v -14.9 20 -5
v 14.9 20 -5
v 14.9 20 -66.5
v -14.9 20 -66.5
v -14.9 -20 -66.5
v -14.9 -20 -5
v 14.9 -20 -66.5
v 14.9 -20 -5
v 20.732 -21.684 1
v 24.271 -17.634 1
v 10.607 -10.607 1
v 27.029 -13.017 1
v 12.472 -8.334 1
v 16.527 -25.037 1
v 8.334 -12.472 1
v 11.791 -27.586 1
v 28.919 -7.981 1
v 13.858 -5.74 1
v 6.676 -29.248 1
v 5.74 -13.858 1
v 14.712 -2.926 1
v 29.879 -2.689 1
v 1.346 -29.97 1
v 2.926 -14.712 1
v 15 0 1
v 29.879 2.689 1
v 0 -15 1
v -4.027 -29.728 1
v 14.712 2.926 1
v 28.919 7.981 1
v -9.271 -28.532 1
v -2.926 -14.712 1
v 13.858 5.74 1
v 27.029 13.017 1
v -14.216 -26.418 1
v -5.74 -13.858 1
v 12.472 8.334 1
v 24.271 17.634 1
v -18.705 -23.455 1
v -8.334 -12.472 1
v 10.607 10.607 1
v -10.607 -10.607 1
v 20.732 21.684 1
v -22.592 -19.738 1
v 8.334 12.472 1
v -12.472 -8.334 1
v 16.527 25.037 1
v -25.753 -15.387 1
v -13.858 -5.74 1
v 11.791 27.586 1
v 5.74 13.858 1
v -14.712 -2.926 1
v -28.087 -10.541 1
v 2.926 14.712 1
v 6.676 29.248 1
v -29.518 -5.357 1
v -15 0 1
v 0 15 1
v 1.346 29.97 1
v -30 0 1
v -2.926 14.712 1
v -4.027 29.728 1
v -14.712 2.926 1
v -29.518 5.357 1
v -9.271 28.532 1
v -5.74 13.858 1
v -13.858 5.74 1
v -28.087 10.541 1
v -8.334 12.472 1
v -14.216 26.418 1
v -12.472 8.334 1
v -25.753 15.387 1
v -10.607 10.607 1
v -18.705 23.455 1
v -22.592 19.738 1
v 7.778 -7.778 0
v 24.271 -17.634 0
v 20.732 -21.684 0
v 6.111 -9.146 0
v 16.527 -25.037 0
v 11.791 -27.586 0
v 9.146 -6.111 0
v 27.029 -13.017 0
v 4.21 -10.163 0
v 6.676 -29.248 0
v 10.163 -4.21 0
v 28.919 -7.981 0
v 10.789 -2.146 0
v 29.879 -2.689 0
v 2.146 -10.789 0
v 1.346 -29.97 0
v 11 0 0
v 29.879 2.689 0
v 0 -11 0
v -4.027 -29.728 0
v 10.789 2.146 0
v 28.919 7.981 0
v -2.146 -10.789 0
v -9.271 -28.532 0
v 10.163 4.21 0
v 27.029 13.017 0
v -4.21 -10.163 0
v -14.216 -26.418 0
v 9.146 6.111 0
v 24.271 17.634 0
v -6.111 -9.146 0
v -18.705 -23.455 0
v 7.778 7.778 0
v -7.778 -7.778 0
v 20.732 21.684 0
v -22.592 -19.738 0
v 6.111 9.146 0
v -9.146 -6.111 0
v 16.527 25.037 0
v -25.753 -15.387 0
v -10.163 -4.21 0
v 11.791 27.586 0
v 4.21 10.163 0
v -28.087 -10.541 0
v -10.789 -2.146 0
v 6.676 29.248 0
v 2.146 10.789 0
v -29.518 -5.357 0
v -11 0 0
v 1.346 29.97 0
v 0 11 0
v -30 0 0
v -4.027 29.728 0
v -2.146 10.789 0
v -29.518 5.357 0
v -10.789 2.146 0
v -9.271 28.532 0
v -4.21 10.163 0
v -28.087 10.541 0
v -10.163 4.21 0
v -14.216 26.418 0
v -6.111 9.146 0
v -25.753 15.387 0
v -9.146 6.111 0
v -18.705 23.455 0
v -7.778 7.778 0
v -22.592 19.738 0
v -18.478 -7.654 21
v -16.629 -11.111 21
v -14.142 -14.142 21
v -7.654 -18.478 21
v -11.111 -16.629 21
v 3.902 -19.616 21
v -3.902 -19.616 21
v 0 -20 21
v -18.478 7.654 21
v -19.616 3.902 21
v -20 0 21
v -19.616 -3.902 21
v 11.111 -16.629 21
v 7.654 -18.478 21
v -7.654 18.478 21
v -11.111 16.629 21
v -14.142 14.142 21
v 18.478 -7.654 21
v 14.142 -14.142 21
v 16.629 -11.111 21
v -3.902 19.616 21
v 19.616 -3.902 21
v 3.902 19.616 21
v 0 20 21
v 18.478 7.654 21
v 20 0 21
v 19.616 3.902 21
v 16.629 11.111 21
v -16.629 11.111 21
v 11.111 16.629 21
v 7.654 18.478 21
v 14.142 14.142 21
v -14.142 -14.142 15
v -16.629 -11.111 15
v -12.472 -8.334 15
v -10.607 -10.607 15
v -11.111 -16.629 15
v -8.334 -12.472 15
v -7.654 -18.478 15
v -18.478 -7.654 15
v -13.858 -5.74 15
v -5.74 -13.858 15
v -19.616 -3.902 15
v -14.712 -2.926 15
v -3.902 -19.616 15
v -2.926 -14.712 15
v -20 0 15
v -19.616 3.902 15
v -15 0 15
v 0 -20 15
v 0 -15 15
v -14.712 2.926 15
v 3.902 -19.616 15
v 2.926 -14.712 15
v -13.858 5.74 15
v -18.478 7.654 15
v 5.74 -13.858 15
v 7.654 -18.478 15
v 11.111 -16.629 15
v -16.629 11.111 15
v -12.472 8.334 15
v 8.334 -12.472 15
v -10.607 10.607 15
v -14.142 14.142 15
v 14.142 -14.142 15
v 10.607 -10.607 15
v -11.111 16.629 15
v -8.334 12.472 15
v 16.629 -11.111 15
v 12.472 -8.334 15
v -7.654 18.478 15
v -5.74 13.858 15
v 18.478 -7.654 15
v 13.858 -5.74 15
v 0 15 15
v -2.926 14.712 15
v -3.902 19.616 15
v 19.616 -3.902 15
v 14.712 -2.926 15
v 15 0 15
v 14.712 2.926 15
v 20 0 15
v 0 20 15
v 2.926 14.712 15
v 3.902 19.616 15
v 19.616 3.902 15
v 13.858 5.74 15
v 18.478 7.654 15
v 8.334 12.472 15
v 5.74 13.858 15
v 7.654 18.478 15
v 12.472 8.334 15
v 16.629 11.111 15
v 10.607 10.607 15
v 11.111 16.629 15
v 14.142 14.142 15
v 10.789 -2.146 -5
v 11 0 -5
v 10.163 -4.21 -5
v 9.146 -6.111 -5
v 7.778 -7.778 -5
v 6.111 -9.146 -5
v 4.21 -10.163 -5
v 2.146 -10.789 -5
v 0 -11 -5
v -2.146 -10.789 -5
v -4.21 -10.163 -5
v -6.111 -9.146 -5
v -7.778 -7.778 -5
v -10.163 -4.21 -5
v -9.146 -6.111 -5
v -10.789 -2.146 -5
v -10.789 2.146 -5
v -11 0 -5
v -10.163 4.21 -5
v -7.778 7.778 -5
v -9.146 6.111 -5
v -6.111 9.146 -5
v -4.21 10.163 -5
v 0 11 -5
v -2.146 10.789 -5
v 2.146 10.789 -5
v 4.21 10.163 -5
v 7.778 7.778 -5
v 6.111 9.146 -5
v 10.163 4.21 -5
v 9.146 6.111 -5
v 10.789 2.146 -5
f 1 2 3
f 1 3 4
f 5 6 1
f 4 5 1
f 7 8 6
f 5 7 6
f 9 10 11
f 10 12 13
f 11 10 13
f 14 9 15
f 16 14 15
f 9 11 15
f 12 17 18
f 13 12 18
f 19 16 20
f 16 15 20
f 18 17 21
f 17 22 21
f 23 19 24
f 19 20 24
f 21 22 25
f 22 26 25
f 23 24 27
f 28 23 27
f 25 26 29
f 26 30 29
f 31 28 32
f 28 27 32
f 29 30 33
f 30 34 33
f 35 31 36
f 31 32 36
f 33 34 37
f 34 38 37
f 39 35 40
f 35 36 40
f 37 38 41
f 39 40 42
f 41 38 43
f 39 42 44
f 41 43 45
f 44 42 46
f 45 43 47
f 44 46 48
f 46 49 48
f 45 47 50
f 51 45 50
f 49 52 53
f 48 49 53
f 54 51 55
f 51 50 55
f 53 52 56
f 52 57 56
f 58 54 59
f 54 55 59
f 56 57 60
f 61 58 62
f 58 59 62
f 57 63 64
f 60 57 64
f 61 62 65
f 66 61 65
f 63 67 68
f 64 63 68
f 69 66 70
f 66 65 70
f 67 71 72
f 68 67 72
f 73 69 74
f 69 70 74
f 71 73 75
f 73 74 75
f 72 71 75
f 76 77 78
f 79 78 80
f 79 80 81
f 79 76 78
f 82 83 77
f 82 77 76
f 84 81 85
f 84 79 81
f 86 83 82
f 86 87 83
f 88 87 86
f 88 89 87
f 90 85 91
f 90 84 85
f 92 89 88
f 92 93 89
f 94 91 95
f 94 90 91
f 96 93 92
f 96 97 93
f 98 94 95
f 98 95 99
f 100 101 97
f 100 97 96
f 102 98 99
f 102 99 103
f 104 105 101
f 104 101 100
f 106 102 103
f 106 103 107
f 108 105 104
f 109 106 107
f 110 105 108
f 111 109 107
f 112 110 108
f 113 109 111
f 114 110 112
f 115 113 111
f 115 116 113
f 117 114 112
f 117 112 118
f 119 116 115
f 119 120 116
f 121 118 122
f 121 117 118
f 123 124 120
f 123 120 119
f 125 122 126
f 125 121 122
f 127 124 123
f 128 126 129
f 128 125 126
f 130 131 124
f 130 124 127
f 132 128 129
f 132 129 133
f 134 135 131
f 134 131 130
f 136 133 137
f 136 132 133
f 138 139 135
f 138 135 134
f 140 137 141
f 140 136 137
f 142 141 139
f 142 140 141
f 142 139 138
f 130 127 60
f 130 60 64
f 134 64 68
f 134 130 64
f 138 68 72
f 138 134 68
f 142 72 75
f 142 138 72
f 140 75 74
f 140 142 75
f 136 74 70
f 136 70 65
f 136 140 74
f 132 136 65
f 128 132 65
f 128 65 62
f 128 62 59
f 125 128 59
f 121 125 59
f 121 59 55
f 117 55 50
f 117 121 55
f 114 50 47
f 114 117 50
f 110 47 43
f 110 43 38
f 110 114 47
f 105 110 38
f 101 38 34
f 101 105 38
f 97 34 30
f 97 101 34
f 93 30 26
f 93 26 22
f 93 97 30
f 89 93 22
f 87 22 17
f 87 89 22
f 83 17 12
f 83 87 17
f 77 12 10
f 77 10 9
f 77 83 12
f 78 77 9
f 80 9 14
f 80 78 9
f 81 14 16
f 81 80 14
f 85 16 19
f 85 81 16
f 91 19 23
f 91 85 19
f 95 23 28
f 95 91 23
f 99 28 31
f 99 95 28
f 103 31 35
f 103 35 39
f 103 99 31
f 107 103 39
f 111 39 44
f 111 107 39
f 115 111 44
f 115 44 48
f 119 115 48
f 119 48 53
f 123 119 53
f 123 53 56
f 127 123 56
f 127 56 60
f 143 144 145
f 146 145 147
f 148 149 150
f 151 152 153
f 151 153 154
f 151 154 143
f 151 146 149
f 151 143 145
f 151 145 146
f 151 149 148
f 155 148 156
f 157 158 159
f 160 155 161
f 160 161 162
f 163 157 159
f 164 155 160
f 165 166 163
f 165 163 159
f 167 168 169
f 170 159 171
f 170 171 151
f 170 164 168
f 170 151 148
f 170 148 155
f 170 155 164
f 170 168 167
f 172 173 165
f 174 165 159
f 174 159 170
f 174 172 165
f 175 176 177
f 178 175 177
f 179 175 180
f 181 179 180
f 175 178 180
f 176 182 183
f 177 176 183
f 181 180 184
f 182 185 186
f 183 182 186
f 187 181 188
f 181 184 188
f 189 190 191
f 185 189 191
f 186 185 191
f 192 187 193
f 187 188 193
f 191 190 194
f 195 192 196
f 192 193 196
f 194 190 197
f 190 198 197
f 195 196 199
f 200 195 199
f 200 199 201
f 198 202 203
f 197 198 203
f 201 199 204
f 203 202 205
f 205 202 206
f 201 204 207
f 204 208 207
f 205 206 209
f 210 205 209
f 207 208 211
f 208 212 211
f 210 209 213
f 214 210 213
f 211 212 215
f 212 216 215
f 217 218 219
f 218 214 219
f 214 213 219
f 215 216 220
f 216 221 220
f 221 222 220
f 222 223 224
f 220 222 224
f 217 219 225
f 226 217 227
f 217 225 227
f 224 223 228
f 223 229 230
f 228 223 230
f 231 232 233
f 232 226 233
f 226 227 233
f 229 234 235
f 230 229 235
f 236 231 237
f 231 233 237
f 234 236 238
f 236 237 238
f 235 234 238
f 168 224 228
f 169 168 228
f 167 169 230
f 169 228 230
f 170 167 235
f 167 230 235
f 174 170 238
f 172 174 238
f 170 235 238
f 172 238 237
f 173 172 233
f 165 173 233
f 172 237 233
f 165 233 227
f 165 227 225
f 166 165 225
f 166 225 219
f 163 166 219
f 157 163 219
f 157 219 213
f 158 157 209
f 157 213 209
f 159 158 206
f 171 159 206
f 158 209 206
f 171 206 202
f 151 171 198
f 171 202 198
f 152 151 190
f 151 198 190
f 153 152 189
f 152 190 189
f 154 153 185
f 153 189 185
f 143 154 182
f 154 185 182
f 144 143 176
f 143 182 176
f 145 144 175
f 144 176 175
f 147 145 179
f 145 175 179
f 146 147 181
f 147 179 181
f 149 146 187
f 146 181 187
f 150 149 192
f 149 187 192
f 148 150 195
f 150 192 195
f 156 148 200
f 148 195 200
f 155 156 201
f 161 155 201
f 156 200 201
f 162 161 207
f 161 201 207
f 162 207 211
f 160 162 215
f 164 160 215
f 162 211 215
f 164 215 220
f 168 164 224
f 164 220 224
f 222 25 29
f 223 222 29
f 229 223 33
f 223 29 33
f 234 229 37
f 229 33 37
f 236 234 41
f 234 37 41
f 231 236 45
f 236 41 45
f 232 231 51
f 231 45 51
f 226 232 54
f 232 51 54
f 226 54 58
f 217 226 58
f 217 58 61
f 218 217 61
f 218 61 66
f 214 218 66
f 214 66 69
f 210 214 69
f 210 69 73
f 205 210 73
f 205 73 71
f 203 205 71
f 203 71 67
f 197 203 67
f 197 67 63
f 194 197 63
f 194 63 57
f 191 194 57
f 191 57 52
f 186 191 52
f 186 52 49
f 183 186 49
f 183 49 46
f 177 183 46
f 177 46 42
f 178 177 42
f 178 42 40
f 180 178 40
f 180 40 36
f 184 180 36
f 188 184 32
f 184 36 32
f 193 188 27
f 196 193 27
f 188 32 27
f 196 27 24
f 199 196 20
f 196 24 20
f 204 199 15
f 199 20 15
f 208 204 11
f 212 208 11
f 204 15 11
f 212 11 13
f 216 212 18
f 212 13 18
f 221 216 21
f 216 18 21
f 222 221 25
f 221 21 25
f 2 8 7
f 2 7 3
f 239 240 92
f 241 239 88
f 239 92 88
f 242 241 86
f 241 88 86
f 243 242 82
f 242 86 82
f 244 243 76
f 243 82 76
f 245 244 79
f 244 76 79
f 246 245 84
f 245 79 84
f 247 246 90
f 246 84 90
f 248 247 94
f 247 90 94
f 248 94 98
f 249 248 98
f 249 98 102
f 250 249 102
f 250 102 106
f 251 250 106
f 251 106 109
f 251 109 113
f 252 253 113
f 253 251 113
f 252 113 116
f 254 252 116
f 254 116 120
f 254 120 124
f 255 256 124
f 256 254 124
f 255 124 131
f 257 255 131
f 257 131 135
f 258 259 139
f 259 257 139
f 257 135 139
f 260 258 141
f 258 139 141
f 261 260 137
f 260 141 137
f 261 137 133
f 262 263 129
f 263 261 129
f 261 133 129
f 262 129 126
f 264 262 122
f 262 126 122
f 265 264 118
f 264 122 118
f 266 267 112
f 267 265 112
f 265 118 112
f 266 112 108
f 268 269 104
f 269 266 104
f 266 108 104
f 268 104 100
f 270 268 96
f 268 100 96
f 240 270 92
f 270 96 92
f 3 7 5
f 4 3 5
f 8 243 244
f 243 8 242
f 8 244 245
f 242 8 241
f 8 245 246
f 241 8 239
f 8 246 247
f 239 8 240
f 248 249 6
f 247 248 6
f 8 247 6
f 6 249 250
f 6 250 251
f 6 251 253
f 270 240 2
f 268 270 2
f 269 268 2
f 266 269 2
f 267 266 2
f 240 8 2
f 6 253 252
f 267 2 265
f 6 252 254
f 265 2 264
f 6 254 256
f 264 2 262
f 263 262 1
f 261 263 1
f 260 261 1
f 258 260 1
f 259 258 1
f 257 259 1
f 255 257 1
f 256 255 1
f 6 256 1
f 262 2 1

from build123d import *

# Parameters (mm, degrees)
SKETCH1_R           = 15
BOSS_EXTRUDE1_DEPTH = 15
SKETCH2_R           = 20
BOSS_EXTRUDE2_DEPTH = 6
SKETCH3_R           = 11
BOSS_EXTRUDE3_DEPTH = 15
BOSS_EXTRUDE4_START = 5
SKETCH4_W           = 29.8
SKETCH4_H           = 40
BOSS_EXTRUDE4_DEPTH = 61.5
SKETCH5_R           = 30
BOSS_EXTRUDE5_DEPTH = 1


with BuildPart() as part:
    # Sketch1 → Boss-Extrude1 (new body)
    with BuildSketch(Plane.XY):
        Circle(SKETCH1_R)
    extrude(amount=BOSS_EXTRUDE1_DEPTH)

    # Sketch2 → Boss-Extrude2 (add)
    with BuildSketch(Plane.XY.offset(15)):
        Circle(SKETCH2_R)
    extrude(amount=BOSS_EXTRUDE2_DEPTH)

    # Sketch3 → Boss-Extrude3 (add)
    with BuildSketch(Plane(origin=(0, 0, 0), x_dir=(-1, 0, 0), z_dir=(0, 0, -1))):
        with Locations(Location((0, 0, 0), (0, 0, 180))):
            Circle(SKETCH3_R)
    extrude(amount=BOSS_EXTRUDE3_DEPTH)

    # Sketch4 → Boss-Extrude4 (add)
    with BuildSketch(Plane(origin=(0, 0, 0), x_dir=(-1, 0, 0), z_dir=(0, 0, -1)).offset(BOSS_EXTRUDE4_START)):
        Rectangle(SKETCH4_W, SKETCH4_H)
    extrude(amount=BOSS_EXTRUDE4_DEPTH)

    # Sketch5 → Boss-Extrude5 (add)
    with BuildSketch(Plane(origin=(0, 0, 0), x_dir=(-1, 0, 0), z_dir=(0, 0, -1))):
        Circle(SKETCH5_R)
    extrude(amount=-BOSS_EXTRUDE5_DEPTH)


solid = part.part
